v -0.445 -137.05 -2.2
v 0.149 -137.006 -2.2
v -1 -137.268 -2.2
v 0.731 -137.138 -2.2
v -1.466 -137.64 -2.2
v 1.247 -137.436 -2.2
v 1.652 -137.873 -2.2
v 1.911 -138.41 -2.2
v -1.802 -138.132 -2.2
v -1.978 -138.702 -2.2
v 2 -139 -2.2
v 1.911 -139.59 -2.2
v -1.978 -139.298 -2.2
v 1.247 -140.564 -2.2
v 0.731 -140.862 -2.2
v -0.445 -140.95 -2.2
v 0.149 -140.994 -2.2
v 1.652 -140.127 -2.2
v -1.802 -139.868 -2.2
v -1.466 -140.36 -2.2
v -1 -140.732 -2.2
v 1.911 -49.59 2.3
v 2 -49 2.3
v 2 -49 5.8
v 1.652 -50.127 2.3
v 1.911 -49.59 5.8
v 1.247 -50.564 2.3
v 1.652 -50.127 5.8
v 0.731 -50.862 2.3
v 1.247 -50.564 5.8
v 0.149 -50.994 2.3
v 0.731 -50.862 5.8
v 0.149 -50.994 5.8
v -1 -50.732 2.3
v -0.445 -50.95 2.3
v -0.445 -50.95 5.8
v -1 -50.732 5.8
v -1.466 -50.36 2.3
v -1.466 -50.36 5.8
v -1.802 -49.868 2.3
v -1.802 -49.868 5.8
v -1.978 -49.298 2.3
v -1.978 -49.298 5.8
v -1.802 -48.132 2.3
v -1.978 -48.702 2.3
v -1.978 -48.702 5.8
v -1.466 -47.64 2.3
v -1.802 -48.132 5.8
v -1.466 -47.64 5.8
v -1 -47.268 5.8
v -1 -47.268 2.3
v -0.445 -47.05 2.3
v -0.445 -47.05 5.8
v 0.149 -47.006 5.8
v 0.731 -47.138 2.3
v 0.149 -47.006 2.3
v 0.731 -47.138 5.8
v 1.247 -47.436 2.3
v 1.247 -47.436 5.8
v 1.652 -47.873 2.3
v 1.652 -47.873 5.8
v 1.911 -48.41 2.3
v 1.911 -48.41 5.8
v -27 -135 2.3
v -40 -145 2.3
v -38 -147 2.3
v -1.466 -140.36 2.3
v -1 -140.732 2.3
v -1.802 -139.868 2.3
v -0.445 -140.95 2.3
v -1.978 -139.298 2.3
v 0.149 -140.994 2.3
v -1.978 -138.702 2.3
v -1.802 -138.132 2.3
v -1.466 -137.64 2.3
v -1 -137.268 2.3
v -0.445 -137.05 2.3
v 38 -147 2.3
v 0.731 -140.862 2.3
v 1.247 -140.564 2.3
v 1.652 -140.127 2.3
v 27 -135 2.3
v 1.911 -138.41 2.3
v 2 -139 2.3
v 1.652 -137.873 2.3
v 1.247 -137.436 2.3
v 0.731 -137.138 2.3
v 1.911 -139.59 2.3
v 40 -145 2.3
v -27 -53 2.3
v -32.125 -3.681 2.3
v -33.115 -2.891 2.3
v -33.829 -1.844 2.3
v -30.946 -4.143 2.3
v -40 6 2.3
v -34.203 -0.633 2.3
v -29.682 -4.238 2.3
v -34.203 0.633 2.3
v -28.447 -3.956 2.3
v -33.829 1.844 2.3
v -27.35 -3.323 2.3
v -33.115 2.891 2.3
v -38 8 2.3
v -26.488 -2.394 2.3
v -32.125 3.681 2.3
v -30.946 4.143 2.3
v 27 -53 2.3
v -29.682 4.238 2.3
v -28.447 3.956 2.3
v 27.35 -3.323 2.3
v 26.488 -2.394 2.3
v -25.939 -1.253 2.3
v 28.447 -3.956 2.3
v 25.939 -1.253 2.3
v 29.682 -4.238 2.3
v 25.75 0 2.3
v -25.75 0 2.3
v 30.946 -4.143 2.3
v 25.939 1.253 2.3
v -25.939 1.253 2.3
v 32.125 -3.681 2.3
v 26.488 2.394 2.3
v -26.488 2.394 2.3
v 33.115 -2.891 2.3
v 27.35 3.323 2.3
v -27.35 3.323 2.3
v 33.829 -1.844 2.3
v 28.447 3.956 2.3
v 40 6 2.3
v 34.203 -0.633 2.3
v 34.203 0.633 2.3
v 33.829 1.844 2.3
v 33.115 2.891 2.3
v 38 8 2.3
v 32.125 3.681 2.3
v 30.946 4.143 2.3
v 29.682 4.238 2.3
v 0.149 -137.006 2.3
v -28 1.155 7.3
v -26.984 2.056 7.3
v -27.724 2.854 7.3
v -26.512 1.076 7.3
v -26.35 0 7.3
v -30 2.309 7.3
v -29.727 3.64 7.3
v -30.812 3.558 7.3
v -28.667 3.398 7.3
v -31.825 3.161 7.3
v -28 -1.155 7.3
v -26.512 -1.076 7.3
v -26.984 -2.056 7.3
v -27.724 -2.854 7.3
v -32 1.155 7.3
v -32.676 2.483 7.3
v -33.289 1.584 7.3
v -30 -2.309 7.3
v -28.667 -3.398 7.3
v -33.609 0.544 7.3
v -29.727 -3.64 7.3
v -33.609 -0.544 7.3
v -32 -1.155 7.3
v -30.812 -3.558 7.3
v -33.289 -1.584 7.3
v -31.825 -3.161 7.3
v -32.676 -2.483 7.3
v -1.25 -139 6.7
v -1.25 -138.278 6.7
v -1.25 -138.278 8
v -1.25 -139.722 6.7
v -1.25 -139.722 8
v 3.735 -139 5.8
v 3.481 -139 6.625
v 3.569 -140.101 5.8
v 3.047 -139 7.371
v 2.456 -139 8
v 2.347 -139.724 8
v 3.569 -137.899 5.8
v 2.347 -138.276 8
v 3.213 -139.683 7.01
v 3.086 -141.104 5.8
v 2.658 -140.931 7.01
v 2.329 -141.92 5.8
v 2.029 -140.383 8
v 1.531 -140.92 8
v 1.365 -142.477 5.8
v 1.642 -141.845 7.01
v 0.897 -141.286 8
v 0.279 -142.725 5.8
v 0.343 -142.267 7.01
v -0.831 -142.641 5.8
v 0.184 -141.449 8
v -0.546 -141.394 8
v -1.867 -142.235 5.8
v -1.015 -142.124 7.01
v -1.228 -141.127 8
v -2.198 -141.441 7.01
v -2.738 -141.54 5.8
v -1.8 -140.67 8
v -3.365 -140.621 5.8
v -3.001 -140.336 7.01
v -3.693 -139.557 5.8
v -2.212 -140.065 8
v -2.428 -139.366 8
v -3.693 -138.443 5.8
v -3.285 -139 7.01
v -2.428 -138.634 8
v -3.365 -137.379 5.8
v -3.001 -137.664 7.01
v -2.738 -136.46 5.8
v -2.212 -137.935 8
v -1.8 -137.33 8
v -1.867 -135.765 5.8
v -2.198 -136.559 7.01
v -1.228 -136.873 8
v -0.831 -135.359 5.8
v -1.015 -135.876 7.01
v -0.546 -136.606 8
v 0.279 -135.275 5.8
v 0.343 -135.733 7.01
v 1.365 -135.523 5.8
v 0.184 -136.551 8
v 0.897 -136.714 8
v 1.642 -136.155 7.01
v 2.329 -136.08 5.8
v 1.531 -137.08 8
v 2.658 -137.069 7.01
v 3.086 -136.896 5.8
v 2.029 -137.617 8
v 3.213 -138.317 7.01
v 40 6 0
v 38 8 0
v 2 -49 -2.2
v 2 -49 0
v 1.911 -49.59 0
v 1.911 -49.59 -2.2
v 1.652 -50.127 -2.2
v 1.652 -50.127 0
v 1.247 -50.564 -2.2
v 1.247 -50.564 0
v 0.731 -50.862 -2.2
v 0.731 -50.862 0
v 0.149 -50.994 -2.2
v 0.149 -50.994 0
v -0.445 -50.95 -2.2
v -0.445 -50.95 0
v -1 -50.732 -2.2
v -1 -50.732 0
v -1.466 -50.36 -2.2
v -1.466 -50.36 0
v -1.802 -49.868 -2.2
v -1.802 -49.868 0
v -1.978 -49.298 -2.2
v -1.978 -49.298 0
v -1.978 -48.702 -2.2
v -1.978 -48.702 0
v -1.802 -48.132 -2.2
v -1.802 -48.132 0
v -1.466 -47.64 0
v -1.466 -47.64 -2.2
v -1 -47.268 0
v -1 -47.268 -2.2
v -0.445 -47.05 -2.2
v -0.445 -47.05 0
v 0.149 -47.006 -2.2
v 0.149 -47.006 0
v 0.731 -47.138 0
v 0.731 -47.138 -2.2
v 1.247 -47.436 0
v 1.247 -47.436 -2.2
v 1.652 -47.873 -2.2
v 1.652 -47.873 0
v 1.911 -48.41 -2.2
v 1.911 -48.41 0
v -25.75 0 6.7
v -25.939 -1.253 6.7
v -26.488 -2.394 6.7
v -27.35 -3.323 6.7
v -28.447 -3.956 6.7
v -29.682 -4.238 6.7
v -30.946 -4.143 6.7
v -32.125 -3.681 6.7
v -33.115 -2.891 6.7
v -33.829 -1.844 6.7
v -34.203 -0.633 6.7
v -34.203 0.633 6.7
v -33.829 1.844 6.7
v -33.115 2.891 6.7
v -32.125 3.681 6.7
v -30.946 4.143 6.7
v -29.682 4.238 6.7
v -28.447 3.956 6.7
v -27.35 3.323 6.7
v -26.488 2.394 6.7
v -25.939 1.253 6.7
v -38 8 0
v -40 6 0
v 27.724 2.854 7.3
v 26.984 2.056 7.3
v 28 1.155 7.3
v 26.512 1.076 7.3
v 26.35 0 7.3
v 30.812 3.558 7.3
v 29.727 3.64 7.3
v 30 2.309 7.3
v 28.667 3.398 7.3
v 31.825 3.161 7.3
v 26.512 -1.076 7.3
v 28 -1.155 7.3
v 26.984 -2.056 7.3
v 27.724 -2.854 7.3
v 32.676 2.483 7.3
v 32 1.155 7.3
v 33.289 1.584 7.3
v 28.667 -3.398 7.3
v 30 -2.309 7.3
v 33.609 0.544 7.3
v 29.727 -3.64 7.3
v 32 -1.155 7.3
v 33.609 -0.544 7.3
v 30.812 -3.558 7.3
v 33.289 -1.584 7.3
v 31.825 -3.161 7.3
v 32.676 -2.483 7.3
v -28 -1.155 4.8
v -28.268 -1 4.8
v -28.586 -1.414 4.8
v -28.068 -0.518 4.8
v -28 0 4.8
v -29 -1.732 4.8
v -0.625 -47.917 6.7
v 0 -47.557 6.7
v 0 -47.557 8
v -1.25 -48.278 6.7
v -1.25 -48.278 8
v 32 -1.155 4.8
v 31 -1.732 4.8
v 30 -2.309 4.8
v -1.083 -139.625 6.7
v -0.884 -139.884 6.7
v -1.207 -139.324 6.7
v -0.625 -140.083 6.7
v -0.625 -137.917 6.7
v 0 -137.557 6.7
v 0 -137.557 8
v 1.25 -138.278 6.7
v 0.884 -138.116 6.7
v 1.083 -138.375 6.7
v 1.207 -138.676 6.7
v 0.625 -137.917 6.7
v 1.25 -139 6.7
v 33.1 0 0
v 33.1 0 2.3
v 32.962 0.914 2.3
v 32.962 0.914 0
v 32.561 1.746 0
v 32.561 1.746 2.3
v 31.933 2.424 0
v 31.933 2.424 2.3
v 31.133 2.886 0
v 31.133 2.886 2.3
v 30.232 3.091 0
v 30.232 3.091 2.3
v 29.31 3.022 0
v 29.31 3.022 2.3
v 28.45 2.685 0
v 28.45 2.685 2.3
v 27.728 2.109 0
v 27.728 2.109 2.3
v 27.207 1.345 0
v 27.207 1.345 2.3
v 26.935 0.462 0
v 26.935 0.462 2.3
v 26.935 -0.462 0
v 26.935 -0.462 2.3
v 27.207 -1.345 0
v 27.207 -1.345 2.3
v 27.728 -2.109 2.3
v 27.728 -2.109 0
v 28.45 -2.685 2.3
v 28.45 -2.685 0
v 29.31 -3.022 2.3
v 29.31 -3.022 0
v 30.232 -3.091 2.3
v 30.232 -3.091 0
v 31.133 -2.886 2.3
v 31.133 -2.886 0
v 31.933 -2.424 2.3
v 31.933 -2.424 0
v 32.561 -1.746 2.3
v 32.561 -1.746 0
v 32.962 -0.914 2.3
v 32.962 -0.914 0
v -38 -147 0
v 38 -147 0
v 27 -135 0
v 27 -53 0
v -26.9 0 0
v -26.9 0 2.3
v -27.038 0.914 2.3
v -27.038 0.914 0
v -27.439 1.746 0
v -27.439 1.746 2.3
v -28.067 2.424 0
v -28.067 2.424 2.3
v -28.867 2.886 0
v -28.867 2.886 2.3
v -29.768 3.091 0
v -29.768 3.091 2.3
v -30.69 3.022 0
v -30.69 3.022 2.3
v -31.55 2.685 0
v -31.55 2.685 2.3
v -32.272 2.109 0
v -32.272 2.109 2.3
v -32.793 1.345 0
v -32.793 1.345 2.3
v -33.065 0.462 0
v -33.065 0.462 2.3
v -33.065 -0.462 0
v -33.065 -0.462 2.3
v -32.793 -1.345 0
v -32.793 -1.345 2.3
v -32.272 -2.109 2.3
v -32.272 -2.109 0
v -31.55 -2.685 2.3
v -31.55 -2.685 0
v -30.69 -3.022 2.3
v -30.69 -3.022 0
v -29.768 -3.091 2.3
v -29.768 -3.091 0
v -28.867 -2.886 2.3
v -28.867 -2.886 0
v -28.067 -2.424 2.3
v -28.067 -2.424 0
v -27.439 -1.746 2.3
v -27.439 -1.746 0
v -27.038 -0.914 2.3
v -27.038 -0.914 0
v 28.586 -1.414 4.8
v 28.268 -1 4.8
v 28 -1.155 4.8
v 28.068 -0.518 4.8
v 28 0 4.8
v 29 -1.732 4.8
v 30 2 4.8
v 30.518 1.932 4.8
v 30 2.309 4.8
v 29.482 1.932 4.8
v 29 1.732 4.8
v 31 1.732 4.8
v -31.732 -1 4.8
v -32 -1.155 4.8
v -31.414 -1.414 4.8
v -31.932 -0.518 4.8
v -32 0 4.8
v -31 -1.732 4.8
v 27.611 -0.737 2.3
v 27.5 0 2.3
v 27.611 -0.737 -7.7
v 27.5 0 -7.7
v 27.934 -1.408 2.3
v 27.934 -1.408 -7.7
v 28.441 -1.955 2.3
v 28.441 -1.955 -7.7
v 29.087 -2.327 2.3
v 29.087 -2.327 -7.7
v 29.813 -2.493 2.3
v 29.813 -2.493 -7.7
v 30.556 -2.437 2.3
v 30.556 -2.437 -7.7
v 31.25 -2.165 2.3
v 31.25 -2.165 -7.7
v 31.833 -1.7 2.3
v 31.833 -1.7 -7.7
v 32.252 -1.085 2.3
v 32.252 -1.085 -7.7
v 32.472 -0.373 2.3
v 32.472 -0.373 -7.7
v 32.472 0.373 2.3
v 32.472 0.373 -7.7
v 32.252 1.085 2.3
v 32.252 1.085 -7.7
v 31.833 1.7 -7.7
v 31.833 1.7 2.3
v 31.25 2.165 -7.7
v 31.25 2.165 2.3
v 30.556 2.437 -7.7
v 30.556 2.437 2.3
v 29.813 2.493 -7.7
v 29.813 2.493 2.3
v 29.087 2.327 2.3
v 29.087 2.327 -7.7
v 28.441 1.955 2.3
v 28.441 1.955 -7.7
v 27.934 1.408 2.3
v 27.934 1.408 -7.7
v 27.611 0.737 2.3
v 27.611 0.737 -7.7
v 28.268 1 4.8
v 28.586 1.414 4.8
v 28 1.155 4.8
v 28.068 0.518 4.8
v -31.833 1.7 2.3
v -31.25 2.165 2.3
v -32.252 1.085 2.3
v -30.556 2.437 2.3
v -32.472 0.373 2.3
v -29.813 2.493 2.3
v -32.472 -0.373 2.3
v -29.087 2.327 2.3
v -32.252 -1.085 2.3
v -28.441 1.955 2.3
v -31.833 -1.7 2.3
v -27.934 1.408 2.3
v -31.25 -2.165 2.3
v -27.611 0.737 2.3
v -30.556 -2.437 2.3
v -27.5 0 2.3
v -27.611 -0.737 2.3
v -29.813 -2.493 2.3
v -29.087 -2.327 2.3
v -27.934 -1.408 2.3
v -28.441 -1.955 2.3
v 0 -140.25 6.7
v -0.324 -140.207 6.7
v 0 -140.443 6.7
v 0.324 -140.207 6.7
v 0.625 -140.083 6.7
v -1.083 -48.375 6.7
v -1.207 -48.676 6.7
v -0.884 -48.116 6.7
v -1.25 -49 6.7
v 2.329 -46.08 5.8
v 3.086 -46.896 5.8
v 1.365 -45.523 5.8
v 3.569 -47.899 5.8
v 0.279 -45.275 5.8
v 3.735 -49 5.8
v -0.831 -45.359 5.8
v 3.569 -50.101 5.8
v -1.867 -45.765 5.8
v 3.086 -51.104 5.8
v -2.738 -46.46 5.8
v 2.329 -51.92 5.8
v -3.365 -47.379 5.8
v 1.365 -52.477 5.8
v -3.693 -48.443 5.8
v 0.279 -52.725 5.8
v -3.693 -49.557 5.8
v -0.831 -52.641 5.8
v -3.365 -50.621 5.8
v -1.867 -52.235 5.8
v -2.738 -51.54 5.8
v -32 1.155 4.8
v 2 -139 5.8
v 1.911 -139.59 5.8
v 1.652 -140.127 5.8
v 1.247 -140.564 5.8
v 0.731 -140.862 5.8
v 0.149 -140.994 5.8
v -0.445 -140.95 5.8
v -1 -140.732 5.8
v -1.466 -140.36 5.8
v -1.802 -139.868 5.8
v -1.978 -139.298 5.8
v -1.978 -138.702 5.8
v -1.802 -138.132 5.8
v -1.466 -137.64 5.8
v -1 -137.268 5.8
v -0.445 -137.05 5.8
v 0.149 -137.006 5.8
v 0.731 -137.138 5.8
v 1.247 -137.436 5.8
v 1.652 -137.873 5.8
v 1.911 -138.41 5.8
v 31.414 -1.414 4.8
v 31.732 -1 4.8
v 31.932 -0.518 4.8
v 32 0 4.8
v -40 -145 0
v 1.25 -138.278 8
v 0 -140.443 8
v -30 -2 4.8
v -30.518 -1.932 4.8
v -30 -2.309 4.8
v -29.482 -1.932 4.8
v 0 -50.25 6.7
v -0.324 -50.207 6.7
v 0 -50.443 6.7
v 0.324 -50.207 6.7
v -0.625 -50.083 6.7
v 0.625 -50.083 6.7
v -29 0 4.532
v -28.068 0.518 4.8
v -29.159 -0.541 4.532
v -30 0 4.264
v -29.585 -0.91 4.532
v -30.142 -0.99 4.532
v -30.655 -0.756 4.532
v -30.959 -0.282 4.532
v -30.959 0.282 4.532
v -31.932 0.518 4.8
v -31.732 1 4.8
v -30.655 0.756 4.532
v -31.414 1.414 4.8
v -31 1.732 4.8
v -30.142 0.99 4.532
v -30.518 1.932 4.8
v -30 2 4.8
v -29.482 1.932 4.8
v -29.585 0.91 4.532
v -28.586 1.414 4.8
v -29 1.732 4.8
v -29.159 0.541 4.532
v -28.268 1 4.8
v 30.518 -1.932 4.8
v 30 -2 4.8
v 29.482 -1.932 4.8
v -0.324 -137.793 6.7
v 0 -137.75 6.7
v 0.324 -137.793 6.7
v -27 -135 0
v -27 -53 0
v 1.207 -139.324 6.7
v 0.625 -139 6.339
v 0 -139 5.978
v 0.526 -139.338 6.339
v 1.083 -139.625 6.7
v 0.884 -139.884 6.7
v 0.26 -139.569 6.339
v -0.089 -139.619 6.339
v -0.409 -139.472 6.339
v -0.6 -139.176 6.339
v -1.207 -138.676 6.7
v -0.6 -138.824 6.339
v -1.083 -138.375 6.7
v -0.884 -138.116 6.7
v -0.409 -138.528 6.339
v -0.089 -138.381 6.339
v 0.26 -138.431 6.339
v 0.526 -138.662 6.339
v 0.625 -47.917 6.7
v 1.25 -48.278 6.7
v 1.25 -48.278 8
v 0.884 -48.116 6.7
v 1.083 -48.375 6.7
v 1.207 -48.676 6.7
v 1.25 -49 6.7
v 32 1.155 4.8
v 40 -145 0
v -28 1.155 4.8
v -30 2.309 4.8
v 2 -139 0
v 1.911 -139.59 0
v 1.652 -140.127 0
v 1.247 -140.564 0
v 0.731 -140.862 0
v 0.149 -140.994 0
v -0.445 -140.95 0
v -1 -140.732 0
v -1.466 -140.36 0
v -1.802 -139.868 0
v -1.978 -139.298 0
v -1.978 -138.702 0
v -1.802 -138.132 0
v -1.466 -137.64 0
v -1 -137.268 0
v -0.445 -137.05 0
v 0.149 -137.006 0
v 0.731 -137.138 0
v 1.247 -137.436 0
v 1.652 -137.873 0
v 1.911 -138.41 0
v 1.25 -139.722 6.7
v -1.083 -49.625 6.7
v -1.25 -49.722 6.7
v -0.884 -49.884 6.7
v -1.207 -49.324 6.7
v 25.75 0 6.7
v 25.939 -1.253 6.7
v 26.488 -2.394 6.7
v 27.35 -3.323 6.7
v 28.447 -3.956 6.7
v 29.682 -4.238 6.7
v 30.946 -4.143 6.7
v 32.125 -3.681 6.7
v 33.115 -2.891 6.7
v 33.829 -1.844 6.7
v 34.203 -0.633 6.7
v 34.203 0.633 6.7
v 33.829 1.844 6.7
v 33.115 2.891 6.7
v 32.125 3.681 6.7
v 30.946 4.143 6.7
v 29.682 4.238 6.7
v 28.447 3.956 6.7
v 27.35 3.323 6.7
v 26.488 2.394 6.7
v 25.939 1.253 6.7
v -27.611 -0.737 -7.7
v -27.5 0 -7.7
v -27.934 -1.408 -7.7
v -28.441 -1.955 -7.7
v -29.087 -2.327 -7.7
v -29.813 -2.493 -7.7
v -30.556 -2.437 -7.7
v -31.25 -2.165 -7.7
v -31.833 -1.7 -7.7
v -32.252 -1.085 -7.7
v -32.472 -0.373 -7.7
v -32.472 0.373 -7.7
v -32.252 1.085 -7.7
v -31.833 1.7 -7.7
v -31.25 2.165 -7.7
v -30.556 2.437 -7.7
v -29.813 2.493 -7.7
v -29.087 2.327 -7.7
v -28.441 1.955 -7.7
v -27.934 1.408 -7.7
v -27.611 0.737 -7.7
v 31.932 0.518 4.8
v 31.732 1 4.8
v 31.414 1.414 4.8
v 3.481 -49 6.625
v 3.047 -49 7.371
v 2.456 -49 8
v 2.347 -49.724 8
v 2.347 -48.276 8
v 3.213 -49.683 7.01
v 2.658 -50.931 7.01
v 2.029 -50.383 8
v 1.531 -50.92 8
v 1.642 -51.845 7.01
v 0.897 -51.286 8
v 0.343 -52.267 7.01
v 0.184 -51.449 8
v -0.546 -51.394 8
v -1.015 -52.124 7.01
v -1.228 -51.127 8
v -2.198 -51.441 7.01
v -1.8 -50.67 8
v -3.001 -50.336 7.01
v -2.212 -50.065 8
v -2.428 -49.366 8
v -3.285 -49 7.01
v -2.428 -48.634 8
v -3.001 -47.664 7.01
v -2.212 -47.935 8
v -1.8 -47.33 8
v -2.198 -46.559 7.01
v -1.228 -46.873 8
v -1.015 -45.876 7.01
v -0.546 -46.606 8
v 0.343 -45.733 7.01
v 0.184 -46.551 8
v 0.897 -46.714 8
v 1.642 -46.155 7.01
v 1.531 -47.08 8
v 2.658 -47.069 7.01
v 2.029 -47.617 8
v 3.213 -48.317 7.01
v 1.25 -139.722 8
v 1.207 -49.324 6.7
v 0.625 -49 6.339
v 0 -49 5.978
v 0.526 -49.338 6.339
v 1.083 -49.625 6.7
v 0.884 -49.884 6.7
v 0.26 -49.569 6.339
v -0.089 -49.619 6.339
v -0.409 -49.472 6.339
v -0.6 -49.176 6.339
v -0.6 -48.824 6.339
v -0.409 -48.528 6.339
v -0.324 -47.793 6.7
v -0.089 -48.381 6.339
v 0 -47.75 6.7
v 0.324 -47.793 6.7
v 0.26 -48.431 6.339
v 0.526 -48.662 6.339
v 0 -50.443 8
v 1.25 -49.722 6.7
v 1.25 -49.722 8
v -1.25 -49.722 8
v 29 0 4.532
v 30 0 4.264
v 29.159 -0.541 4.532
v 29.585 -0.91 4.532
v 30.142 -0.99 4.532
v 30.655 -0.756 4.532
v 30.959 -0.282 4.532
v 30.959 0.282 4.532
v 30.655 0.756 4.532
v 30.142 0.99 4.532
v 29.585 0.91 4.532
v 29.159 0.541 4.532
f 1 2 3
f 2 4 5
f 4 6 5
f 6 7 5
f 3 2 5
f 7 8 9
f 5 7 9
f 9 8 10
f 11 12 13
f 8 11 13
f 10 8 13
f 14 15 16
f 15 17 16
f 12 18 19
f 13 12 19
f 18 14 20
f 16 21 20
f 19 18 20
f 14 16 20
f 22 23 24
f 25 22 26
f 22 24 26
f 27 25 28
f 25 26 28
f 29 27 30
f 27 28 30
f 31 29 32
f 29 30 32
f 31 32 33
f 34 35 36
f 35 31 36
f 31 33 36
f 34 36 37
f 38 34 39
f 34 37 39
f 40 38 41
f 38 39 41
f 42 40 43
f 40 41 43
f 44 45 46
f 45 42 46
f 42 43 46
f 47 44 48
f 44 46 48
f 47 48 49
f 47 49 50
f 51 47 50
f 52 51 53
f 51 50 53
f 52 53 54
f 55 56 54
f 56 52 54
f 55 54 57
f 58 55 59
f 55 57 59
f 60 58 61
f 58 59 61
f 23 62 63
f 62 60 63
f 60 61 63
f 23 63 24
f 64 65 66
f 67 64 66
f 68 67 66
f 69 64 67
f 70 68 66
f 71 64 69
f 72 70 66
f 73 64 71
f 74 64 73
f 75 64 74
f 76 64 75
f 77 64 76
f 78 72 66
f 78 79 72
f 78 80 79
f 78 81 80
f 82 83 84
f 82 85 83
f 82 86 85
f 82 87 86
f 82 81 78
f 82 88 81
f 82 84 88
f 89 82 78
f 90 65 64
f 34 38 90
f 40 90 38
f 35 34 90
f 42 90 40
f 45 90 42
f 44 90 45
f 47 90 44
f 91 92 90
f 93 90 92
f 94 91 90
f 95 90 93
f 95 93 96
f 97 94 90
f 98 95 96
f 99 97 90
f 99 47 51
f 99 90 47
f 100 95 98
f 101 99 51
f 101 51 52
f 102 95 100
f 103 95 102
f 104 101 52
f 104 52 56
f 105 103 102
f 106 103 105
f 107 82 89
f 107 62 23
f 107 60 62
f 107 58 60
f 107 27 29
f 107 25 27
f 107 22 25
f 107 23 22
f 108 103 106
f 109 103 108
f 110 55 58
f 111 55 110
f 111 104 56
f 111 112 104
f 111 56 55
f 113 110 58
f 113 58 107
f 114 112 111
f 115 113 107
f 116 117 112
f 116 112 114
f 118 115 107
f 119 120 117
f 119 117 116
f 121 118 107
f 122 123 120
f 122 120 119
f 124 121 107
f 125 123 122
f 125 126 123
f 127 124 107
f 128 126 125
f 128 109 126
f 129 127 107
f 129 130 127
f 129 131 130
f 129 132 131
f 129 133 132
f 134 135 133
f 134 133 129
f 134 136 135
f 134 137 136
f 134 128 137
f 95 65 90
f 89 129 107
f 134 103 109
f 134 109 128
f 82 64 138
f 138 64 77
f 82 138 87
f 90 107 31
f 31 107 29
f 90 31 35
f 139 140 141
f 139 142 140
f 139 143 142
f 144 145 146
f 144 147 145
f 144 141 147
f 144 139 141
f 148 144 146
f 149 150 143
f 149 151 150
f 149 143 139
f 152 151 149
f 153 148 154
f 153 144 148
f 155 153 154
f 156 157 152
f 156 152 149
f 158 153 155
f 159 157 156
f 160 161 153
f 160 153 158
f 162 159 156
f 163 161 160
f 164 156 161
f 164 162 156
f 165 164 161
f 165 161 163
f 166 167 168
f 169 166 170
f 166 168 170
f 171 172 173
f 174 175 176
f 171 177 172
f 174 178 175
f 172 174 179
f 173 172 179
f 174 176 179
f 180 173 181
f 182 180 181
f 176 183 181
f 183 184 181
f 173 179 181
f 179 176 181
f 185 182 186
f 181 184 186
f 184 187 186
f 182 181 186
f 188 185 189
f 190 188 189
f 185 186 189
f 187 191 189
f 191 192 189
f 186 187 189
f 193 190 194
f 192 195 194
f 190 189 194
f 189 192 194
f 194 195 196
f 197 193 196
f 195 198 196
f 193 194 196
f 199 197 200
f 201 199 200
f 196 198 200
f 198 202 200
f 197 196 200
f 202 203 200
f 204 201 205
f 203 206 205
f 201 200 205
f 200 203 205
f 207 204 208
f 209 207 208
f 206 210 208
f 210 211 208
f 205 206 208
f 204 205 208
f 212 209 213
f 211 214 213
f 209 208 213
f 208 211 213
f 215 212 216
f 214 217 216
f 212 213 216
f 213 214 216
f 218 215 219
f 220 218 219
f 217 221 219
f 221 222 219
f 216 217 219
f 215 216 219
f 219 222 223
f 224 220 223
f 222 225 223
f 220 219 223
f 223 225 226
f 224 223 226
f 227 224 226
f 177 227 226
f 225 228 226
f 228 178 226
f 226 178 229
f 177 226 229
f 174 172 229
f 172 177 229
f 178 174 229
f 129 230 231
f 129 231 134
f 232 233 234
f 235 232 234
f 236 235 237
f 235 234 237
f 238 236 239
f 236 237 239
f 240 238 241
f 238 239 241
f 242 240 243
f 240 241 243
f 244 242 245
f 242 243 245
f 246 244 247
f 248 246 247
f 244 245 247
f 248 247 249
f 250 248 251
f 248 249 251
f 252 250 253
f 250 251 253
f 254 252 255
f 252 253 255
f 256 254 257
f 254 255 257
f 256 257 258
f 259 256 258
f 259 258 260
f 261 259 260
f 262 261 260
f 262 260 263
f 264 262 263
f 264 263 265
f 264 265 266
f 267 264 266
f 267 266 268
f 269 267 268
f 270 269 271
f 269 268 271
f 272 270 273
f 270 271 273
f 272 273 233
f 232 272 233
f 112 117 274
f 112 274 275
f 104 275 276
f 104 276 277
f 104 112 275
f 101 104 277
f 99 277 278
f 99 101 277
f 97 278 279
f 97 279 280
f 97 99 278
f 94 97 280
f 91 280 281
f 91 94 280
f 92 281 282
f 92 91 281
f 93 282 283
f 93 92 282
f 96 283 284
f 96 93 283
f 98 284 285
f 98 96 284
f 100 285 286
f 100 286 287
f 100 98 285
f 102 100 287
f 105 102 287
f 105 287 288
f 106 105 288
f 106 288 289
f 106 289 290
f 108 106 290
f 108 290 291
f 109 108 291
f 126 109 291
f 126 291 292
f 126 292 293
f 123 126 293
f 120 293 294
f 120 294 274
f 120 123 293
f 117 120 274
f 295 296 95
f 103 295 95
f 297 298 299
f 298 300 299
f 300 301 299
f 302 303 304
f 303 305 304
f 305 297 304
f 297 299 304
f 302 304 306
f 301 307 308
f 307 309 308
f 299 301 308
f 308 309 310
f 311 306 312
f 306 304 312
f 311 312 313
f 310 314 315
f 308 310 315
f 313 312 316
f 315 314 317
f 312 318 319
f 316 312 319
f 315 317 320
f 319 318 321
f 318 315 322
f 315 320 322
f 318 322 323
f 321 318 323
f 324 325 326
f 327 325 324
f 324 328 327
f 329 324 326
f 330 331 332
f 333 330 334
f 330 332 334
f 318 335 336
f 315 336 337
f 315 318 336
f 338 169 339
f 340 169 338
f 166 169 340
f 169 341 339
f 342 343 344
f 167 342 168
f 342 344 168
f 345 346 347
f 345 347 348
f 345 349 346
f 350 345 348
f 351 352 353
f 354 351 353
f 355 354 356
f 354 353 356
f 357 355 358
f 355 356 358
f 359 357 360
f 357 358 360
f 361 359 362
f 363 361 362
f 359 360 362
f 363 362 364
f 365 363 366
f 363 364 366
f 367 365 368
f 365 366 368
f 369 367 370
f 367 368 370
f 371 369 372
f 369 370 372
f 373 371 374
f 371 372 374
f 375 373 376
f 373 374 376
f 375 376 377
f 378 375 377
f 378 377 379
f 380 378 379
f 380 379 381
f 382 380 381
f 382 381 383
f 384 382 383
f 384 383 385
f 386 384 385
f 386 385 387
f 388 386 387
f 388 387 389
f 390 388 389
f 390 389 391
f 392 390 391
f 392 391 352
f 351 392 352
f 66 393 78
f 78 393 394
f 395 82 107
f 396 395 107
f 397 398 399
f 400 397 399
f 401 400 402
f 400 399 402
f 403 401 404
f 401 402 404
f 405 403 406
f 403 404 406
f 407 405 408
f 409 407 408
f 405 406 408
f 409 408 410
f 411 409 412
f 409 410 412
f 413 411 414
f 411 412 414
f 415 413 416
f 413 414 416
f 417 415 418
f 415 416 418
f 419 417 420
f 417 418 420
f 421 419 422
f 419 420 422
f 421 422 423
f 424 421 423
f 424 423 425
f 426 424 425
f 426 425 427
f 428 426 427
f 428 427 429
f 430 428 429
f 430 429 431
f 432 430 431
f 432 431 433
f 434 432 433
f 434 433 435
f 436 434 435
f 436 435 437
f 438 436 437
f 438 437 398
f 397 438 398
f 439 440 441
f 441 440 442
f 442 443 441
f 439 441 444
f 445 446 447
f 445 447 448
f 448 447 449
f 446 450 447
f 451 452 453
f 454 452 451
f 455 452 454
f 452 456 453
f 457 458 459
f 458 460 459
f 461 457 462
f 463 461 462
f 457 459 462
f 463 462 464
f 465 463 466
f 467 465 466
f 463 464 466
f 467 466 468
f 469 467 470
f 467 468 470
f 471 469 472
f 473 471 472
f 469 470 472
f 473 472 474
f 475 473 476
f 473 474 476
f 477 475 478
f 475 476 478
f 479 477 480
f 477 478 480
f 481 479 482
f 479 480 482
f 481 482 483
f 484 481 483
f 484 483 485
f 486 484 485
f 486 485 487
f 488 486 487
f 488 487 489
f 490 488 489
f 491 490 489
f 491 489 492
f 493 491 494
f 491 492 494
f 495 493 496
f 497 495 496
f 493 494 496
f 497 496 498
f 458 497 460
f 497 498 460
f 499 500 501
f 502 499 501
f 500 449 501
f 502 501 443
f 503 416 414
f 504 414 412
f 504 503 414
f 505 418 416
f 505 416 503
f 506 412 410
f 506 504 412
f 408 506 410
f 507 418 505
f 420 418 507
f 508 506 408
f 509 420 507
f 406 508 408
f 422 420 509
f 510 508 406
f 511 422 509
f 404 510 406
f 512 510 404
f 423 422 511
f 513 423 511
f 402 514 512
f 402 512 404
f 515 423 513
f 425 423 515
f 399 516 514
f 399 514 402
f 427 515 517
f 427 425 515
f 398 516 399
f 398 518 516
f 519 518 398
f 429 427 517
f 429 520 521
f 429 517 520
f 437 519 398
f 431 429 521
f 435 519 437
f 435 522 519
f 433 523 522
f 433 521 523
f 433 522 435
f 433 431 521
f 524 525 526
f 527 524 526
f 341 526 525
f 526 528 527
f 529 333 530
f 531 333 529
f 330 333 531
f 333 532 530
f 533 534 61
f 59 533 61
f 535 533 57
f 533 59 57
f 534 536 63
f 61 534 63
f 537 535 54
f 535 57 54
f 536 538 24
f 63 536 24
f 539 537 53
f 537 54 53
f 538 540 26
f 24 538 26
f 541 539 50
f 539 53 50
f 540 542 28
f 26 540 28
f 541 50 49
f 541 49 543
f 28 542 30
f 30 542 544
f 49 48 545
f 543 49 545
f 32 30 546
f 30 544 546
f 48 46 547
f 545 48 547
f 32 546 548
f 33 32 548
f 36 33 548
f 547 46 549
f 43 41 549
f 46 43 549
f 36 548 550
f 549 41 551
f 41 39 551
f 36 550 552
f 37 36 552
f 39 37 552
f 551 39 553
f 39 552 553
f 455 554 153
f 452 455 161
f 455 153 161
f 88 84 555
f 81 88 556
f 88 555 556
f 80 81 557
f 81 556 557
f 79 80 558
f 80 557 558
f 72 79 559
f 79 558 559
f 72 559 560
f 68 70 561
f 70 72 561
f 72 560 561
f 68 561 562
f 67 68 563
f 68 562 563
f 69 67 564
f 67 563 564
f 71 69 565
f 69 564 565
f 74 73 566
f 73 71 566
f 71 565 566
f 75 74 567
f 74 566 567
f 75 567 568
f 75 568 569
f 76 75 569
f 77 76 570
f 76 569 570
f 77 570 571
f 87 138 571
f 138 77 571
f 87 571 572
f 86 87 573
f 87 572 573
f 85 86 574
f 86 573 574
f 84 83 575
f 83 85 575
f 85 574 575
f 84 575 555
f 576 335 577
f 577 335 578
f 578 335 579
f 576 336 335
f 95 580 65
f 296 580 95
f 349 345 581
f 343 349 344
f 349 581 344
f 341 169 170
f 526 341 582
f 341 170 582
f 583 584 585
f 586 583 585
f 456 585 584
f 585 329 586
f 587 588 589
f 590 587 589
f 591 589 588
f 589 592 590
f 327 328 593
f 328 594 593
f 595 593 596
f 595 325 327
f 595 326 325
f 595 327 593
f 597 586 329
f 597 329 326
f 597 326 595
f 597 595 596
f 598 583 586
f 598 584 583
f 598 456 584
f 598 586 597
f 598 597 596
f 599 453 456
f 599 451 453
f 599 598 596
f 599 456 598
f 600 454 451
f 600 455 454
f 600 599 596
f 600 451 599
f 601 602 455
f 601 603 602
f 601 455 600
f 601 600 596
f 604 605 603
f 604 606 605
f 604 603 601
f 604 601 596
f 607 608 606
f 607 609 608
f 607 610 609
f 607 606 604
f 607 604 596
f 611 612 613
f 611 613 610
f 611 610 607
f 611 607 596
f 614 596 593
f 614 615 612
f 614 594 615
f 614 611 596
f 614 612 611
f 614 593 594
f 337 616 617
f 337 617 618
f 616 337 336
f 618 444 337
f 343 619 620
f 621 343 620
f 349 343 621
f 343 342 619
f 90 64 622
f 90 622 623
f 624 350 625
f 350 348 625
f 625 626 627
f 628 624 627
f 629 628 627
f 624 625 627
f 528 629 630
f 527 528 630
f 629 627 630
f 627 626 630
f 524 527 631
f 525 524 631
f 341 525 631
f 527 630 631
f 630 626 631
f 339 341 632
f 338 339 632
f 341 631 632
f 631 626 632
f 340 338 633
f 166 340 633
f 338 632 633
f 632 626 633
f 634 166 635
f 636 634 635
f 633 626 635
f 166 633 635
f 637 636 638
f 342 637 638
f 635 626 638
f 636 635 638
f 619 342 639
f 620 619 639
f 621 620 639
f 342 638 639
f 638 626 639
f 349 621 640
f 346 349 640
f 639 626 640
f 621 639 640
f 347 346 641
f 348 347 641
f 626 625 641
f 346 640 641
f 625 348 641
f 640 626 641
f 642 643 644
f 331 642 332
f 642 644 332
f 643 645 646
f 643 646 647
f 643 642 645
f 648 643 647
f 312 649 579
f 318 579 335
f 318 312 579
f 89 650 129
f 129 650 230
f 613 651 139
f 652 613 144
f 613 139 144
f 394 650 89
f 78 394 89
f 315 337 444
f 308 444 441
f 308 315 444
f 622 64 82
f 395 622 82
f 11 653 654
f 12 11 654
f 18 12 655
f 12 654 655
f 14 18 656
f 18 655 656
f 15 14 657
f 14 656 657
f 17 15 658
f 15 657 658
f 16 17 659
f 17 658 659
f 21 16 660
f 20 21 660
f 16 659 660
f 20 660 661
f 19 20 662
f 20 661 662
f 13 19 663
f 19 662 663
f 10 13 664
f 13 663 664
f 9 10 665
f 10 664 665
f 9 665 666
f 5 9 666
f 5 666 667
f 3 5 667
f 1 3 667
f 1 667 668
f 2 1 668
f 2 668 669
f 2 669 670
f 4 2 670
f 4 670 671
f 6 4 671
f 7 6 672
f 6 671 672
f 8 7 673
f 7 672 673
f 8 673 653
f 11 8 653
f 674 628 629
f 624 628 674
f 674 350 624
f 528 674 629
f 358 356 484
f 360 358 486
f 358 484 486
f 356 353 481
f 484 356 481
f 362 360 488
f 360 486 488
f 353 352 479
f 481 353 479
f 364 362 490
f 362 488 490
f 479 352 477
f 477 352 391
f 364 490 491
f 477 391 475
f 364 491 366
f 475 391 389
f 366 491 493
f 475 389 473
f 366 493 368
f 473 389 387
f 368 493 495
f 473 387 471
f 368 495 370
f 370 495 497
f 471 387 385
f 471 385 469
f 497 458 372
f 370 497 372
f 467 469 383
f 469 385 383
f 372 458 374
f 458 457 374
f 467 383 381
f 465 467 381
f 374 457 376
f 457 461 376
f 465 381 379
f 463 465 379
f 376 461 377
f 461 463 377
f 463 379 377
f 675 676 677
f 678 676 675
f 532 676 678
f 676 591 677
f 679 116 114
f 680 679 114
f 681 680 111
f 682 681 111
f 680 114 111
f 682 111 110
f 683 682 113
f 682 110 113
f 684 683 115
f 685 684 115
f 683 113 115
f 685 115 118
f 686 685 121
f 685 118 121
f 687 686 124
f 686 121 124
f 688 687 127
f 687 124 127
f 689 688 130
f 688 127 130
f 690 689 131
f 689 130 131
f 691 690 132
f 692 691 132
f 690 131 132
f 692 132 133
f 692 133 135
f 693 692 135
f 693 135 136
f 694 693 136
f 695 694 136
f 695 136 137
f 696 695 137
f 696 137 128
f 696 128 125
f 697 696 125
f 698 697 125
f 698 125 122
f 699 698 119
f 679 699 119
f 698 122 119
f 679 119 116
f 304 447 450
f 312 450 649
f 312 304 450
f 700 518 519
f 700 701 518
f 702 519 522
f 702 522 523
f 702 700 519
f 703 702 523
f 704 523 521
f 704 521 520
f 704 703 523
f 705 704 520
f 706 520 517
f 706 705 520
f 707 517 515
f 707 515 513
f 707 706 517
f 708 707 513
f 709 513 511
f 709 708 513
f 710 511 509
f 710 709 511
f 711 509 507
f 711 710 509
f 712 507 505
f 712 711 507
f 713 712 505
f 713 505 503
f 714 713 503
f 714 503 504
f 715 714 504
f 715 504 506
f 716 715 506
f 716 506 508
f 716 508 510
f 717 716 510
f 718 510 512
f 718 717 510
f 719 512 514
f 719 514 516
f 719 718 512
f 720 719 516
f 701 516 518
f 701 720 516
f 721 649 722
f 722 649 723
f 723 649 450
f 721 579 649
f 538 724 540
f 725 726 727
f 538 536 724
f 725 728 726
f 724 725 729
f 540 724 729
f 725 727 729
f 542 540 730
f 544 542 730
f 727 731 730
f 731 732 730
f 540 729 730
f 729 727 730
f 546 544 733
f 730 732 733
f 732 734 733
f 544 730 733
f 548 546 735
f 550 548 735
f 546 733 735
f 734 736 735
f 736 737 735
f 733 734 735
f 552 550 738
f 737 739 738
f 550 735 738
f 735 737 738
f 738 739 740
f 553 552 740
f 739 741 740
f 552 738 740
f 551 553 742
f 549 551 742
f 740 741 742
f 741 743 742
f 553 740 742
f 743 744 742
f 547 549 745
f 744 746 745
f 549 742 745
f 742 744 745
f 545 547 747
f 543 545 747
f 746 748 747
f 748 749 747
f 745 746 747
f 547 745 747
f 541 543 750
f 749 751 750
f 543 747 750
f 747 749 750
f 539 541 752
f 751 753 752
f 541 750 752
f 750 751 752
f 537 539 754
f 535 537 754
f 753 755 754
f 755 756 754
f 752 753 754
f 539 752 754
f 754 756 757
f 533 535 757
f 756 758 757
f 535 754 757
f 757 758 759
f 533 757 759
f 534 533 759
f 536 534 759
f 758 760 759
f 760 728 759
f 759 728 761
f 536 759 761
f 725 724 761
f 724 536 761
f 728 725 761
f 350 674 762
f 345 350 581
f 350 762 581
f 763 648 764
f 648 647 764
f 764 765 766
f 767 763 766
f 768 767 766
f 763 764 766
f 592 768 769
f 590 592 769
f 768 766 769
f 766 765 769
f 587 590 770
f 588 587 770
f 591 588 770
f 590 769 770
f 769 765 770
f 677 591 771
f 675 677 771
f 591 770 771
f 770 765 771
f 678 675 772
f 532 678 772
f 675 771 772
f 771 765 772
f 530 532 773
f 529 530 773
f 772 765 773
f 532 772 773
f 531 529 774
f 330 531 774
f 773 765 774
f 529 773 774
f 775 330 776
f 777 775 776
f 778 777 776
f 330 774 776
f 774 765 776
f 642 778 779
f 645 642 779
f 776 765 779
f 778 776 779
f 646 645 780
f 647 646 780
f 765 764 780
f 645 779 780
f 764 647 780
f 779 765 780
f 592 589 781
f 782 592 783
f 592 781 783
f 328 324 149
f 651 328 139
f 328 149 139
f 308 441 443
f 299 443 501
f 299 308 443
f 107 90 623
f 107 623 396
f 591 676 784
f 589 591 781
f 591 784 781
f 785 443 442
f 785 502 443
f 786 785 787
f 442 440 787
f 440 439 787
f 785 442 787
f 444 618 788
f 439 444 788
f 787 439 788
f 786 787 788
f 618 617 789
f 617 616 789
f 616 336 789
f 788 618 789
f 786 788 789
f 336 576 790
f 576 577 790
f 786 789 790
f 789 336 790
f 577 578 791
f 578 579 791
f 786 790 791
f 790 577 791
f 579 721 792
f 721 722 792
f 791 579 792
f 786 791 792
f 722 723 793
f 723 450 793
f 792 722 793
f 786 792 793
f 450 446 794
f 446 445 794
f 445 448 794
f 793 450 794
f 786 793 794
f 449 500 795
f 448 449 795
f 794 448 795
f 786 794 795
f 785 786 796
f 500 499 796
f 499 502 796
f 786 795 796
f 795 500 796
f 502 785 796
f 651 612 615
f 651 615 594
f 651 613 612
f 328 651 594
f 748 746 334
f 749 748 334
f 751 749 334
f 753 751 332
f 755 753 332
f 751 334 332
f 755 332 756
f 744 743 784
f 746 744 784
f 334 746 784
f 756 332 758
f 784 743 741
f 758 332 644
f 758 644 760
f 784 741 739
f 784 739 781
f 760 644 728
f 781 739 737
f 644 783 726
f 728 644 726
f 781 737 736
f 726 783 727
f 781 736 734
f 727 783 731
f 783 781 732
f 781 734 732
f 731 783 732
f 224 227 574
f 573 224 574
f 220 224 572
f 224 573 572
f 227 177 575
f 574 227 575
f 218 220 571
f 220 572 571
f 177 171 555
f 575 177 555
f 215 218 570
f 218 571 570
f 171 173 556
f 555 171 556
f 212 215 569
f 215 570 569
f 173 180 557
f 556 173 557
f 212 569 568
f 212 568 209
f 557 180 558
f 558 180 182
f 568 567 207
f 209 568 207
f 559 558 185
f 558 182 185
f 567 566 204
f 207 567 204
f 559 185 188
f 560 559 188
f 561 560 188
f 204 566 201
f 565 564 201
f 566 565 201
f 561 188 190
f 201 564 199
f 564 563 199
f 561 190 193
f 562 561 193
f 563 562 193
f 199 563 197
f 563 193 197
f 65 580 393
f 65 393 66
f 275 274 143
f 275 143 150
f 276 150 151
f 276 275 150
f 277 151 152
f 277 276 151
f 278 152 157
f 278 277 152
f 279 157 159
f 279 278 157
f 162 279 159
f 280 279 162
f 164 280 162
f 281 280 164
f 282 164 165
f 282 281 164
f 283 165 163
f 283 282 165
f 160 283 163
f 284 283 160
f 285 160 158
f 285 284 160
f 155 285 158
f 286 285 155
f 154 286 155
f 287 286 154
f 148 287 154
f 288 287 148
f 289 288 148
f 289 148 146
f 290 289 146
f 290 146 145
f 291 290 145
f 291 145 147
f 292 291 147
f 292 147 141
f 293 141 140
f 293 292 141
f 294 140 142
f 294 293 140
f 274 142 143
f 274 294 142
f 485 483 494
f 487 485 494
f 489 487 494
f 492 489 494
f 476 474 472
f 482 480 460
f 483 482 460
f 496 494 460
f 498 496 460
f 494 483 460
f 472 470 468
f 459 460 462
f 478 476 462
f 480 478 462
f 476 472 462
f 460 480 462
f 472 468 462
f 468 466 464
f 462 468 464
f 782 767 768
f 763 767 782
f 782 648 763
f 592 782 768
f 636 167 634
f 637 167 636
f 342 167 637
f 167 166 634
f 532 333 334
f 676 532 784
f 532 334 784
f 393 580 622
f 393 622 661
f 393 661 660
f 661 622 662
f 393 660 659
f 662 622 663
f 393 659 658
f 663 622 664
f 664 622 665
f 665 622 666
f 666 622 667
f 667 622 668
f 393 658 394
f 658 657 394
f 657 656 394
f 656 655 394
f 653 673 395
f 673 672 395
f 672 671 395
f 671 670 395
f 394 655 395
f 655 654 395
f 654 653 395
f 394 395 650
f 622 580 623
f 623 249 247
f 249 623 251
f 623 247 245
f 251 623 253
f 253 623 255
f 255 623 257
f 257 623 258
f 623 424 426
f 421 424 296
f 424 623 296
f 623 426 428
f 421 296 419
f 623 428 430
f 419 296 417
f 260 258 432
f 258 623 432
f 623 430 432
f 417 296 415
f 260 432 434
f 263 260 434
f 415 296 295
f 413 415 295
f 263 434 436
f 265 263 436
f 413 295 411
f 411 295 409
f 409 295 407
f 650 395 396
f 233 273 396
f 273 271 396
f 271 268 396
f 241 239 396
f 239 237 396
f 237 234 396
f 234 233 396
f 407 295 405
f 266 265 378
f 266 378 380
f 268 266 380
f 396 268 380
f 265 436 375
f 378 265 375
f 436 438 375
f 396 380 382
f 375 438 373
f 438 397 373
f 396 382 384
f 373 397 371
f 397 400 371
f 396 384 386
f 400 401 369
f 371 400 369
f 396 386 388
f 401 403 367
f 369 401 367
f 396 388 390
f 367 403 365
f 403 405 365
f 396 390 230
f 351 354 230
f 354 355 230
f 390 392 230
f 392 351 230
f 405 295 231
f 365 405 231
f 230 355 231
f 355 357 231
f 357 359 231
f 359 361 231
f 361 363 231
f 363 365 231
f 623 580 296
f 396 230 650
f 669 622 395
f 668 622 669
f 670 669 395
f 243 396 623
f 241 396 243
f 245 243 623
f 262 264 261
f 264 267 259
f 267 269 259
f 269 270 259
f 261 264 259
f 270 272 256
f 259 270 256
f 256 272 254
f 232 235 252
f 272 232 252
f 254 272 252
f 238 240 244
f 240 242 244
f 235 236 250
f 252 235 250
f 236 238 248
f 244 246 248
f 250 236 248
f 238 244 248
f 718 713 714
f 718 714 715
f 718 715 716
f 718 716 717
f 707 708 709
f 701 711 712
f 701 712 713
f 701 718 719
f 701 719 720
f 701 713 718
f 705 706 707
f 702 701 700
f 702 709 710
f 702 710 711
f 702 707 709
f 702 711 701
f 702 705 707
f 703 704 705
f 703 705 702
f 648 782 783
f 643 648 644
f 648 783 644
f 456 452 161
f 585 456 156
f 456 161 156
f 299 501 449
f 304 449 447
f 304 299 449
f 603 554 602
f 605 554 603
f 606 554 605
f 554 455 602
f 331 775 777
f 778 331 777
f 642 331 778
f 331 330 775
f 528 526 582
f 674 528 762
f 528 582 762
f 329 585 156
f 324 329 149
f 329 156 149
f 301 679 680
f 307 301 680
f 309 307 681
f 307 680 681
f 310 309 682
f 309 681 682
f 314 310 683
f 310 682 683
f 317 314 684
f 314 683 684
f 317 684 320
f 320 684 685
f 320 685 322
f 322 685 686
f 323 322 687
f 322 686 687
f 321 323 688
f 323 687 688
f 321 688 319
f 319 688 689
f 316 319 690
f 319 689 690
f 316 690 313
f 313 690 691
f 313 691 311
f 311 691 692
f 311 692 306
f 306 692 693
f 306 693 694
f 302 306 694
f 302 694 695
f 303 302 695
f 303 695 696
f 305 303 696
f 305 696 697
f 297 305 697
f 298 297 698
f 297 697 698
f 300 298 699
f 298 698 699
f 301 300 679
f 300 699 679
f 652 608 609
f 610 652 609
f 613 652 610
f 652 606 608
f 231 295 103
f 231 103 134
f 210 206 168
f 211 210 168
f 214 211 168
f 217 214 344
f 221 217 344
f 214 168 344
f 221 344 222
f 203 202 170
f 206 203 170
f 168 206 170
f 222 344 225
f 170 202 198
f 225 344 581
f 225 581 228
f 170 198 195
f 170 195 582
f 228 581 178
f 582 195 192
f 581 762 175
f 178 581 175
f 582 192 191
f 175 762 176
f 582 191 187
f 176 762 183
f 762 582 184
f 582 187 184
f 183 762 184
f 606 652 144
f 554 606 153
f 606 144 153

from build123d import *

# Parameters (mm, degrees)
SKETCH1_W                = 80
SKETCH1_H                = 155
BOSS_EXTRUDE1_DEPTH      = 2.3
SKETCH2_R                = 3.1
SKETCH2_W                = 54
SKETCH2_H                = 82
CUT_EXTRUDE1_DEPTH       = 153.362364119
CHAMFER1_SIZE            = 2
CUT_EXTRUDE2_DEPTH       = 2.5
CHAMFER2_SIZE            = 0.6
CHAMFER2_OF_MIRROR1_SIZE = 0.6
CUT_EXTRUDE3_DEPTH       = 1.3
LPATTERN1_COUNT          = 2
LPATTERN1_PITCH          = 90


with BuildPart() as part:
    # Sketch1 → Boss-Extrude1 (new body)
    with BuildSketch(Plane.XY):
        with Locations((0, -69.5)):
            Rectangle(SKETCH1_W, SKETCH1_H)
    extrude(amount=BOSS_EXTRUDE1_DEPTH)

    # Sketch2 → Cut-Extrude1 (cut, through all)
    with BuildSketch(Plane.XY.offset(2.3)):
        with Locations((-30, 0)):
            Circle(SKETCH2_R)
        with Locations((30, 0)):
            Circle(SKETCH2_R)
        with Locations((0, -94)):
            Rectangle(SKETCH2_W, SKETCH2_H)
    extrude(amount=-CUT_EXTRUDE1_DEPTH, mode=Mode.SUBTRACT)

    # Chamfer1
    chamfer1_edges = [part.edges().sort_by_distance(p)[0] for p in [
        (40, -147, 1.15),
        (40, 8, 1.15),
        (-40, 8, 1.15),
        (-40, -147, 1.15),
    ]]
    chamfer(chamfer1_edges, length=CHAMFER1_SIZE)

    # Sketch3 → Revolve1 (revolve)
    with BuildSketch(Plane(origin=(0, 0, 0), x_dir=(1, 0, 0), z_dir=(0, 1, 0))):
        Polygon((-28, -7.3), (-25.75, -7.3), (-25.75, -2.3), (-27.5, -2.3), (-27.5, 7.7), (-30, 7.7), (-30, -4.264101615), (-28, -4.8), align=None)
    revolve1 = revolve(axis=Axis((-30, 0, 7.3), (0, 0, -1)))

    # Sketch4 → Cut-Extrude2 (cut)
    with BuildSketch(Plane.XY.offset(7.3)):
        Polygon((-30, 2.309401077), (-32, 1.154700538), (-32, -1.154700538), (-30, -2.309401077), (-28, -1.154700538), (-28, 1.154700538), align=None)
    cut_extrude2 = extrude(amount=-CUT_EXTRUDE2_DEPTH, mode=Mode.SUBTRACT)

    # Chamfer2
    chamfer2_edges = [part.edges().sort_by_distance(p)[0] for p in [
        (-34.25, 0, 7.3),
    ]]
    chamfer(chamfer2_edges, length=CHAMFER2_SIZE)

    # Mirror1: Revolve1, Cut-Extrude2 across plane
    add(revolve1.mirror(Plane(origin=(0, 0, 0), x_dir=(0, 0, 1), z_dir=(1, 0, 0))))
    add(cut_extrude2.mirror(Plane(origin=(0, 0, 0), x_dir=(0, 0, 1), z_dir=(1, 0, 0))), mode=Mode.SUBTRACT)

    # Chamfer2 of Mirror1
    chamfer2_of_mirror1_edges = [part.edges().sort_by_distance(p)[0] for p in [
        (34.25, 0, 7.3),
    ]]
    chamfer(chamfer2_of_mirror1_edges, length=CHAMFER2_OF_MIRROR1_SIZE)

    # Sketch5 → Revolve2 (revolve)
    with BuildSketch(Plane(origin=(0, 0, 0), x_dir=(0, 0, -1), z_dir=(1, 0, 0)), mode=Mode.PRIVATE) as revolve2_sk:
        with BuildLine():
            Line((2.2, -47), (-5.8, -47))
            Line((-5.8, -47), (-5.8, -45.265030121))
            ThreePointArc((-5.8, -45.265030121), (-7.010286128, -45.715063637), (-8, -46.544394168))
            Line((-8, -46.544394168), (-8, -47.75))
            Line((-8, -47.75), (-6.7, -47.75))
            Line((-6.7, -47.75), (-5.978312164, -49))
            Line((-5.978312164, -49), (2.2, -49))
            Line((2.2, -49), (2.2, -47))
        make_face()
    revolve2 = revolve(revolve2_sk.sketch.rotate(Axis((0, -49, 8), (0, 0, -1)), 90), axis=Axis((0, -49, 8), (0, 0, -1)))

    # Sketch6 → Cut-Extrude3 (cut)
    with BuildSketch(Plane.XY.offset(8)):
        Polygon((0, -47.556624327), (-1.25, -48.278312164), (-1.25, -49.721687836), (0, -50.443375673), (1.25, -49.721687836), (1.25, -48.278312164), align=None)
    cut_extrude3 = extrude(amount=-CUT_EXTRUDE3_DEPTH, mode=Mode.SUBTRACT)

    # LPattern1: Revolve2, Cut-Extrude3 ×2
    with Locations(*[(0, -i * LPATTERN1_PITCH, 0) for i in range(1, LPATTERN1_COUNT)]):
        add(revolve2)
        add(cut_extrude3, mode=Mode.SUBTRACT)


solid = part.part
